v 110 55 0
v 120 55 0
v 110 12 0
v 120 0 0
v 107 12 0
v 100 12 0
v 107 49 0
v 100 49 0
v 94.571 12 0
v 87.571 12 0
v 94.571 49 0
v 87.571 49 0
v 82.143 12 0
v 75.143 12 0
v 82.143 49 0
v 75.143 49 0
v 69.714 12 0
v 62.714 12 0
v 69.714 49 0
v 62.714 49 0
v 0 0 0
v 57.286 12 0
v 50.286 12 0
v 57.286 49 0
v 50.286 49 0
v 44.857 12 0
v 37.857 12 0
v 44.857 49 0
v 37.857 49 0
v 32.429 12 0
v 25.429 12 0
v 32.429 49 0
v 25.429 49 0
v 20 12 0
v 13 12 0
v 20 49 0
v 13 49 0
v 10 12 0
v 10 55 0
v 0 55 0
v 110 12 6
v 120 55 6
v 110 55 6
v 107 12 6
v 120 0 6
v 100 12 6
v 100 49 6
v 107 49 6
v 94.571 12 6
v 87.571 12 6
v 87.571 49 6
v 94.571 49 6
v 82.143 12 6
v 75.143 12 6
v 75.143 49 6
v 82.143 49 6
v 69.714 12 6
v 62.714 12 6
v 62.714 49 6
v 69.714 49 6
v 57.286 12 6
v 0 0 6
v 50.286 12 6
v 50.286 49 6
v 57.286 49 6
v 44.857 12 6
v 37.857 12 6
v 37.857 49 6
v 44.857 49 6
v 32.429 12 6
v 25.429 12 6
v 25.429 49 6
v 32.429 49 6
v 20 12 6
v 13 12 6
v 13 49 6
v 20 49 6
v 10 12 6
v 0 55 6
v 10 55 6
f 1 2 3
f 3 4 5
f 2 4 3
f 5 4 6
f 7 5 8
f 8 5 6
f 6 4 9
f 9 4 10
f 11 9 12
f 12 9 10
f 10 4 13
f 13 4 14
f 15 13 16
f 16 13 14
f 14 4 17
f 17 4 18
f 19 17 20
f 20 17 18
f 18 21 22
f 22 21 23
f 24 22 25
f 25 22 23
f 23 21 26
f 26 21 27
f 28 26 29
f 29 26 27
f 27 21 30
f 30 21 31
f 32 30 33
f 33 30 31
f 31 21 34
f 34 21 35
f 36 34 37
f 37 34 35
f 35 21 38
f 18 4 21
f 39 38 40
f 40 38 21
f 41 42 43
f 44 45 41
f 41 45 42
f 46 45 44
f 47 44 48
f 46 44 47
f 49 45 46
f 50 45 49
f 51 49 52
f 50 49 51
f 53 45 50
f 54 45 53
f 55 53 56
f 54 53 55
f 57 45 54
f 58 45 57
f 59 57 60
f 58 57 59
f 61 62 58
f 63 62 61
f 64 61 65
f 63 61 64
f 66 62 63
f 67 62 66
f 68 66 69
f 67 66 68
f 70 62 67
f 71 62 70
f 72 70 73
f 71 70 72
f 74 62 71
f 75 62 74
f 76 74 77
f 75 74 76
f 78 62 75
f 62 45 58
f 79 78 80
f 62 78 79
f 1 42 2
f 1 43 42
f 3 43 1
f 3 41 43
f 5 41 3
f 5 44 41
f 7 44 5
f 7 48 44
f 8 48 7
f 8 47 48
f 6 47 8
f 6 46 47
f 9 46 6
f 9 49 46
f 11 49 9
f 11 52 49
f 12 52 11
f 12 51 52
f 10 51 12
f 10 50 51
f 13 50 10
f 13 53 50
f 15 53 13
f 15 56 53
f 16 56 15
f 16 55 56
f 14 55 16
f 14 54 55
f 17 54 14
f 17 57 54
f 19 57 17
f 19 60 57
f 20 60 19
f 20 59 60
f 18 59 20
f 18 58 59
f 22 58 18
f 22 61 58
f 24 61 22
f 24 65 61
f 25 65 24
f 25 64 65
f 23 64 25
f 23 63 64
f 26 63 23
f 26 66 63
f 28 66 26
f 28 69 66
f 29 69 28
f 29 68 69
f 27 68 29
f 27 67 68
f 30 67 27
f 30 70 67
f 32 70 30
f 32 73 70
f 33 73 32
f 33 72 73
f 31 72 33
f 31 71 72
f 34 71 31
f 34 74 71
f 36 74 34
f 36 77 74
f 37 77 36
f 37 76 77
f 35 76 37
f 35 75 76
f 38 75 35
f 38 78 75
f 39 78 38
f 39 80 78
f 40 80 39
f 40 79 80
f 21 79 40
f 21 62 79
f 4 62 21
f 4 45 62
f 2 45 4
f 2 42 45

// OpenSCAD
$fn = 32;

// ----------------------------------------------------------------------
// Guard grille: 8 slats over a 120 x 55 mm plate
// ----------------------------------------------------------------------

// --- parameters (mm) ---
profile_height = 6;       // extrusion height
profile_points = 40;      // points of the closed outline

profile = [[0, 0], [120, 0], [120, 55], [110, 55], [110, 12], [107, 12], [107, 49], [100, 49], [100, 12], [94.571, 12], [94.571, 49], [87.571, 49], [87.571, 12], [82.143, 12], [82.143, 49], [75.143, 49], [75.143, 12], [69.714, 12], [69.714, 49], [62.714, 49], [62.714, 12], [57.286, 12], [57.286, 49], [50.286, 49], [50.286, 12], [44.857, 12], [44.857, 49], [37.857, 49], [37.857, 12], [32.429, 12], [32.429, 49], [25.429, 49], [25.429, 12], [20, 12], [20, 49], [13, 49], [13, 12], [10, 12], [10, 55], [0, 55]];  // single closed polygon, 40 points, counter clockwise

// --- the one profile operation ---
linear_extrude(height = profile_height) polygon(points = profile);
